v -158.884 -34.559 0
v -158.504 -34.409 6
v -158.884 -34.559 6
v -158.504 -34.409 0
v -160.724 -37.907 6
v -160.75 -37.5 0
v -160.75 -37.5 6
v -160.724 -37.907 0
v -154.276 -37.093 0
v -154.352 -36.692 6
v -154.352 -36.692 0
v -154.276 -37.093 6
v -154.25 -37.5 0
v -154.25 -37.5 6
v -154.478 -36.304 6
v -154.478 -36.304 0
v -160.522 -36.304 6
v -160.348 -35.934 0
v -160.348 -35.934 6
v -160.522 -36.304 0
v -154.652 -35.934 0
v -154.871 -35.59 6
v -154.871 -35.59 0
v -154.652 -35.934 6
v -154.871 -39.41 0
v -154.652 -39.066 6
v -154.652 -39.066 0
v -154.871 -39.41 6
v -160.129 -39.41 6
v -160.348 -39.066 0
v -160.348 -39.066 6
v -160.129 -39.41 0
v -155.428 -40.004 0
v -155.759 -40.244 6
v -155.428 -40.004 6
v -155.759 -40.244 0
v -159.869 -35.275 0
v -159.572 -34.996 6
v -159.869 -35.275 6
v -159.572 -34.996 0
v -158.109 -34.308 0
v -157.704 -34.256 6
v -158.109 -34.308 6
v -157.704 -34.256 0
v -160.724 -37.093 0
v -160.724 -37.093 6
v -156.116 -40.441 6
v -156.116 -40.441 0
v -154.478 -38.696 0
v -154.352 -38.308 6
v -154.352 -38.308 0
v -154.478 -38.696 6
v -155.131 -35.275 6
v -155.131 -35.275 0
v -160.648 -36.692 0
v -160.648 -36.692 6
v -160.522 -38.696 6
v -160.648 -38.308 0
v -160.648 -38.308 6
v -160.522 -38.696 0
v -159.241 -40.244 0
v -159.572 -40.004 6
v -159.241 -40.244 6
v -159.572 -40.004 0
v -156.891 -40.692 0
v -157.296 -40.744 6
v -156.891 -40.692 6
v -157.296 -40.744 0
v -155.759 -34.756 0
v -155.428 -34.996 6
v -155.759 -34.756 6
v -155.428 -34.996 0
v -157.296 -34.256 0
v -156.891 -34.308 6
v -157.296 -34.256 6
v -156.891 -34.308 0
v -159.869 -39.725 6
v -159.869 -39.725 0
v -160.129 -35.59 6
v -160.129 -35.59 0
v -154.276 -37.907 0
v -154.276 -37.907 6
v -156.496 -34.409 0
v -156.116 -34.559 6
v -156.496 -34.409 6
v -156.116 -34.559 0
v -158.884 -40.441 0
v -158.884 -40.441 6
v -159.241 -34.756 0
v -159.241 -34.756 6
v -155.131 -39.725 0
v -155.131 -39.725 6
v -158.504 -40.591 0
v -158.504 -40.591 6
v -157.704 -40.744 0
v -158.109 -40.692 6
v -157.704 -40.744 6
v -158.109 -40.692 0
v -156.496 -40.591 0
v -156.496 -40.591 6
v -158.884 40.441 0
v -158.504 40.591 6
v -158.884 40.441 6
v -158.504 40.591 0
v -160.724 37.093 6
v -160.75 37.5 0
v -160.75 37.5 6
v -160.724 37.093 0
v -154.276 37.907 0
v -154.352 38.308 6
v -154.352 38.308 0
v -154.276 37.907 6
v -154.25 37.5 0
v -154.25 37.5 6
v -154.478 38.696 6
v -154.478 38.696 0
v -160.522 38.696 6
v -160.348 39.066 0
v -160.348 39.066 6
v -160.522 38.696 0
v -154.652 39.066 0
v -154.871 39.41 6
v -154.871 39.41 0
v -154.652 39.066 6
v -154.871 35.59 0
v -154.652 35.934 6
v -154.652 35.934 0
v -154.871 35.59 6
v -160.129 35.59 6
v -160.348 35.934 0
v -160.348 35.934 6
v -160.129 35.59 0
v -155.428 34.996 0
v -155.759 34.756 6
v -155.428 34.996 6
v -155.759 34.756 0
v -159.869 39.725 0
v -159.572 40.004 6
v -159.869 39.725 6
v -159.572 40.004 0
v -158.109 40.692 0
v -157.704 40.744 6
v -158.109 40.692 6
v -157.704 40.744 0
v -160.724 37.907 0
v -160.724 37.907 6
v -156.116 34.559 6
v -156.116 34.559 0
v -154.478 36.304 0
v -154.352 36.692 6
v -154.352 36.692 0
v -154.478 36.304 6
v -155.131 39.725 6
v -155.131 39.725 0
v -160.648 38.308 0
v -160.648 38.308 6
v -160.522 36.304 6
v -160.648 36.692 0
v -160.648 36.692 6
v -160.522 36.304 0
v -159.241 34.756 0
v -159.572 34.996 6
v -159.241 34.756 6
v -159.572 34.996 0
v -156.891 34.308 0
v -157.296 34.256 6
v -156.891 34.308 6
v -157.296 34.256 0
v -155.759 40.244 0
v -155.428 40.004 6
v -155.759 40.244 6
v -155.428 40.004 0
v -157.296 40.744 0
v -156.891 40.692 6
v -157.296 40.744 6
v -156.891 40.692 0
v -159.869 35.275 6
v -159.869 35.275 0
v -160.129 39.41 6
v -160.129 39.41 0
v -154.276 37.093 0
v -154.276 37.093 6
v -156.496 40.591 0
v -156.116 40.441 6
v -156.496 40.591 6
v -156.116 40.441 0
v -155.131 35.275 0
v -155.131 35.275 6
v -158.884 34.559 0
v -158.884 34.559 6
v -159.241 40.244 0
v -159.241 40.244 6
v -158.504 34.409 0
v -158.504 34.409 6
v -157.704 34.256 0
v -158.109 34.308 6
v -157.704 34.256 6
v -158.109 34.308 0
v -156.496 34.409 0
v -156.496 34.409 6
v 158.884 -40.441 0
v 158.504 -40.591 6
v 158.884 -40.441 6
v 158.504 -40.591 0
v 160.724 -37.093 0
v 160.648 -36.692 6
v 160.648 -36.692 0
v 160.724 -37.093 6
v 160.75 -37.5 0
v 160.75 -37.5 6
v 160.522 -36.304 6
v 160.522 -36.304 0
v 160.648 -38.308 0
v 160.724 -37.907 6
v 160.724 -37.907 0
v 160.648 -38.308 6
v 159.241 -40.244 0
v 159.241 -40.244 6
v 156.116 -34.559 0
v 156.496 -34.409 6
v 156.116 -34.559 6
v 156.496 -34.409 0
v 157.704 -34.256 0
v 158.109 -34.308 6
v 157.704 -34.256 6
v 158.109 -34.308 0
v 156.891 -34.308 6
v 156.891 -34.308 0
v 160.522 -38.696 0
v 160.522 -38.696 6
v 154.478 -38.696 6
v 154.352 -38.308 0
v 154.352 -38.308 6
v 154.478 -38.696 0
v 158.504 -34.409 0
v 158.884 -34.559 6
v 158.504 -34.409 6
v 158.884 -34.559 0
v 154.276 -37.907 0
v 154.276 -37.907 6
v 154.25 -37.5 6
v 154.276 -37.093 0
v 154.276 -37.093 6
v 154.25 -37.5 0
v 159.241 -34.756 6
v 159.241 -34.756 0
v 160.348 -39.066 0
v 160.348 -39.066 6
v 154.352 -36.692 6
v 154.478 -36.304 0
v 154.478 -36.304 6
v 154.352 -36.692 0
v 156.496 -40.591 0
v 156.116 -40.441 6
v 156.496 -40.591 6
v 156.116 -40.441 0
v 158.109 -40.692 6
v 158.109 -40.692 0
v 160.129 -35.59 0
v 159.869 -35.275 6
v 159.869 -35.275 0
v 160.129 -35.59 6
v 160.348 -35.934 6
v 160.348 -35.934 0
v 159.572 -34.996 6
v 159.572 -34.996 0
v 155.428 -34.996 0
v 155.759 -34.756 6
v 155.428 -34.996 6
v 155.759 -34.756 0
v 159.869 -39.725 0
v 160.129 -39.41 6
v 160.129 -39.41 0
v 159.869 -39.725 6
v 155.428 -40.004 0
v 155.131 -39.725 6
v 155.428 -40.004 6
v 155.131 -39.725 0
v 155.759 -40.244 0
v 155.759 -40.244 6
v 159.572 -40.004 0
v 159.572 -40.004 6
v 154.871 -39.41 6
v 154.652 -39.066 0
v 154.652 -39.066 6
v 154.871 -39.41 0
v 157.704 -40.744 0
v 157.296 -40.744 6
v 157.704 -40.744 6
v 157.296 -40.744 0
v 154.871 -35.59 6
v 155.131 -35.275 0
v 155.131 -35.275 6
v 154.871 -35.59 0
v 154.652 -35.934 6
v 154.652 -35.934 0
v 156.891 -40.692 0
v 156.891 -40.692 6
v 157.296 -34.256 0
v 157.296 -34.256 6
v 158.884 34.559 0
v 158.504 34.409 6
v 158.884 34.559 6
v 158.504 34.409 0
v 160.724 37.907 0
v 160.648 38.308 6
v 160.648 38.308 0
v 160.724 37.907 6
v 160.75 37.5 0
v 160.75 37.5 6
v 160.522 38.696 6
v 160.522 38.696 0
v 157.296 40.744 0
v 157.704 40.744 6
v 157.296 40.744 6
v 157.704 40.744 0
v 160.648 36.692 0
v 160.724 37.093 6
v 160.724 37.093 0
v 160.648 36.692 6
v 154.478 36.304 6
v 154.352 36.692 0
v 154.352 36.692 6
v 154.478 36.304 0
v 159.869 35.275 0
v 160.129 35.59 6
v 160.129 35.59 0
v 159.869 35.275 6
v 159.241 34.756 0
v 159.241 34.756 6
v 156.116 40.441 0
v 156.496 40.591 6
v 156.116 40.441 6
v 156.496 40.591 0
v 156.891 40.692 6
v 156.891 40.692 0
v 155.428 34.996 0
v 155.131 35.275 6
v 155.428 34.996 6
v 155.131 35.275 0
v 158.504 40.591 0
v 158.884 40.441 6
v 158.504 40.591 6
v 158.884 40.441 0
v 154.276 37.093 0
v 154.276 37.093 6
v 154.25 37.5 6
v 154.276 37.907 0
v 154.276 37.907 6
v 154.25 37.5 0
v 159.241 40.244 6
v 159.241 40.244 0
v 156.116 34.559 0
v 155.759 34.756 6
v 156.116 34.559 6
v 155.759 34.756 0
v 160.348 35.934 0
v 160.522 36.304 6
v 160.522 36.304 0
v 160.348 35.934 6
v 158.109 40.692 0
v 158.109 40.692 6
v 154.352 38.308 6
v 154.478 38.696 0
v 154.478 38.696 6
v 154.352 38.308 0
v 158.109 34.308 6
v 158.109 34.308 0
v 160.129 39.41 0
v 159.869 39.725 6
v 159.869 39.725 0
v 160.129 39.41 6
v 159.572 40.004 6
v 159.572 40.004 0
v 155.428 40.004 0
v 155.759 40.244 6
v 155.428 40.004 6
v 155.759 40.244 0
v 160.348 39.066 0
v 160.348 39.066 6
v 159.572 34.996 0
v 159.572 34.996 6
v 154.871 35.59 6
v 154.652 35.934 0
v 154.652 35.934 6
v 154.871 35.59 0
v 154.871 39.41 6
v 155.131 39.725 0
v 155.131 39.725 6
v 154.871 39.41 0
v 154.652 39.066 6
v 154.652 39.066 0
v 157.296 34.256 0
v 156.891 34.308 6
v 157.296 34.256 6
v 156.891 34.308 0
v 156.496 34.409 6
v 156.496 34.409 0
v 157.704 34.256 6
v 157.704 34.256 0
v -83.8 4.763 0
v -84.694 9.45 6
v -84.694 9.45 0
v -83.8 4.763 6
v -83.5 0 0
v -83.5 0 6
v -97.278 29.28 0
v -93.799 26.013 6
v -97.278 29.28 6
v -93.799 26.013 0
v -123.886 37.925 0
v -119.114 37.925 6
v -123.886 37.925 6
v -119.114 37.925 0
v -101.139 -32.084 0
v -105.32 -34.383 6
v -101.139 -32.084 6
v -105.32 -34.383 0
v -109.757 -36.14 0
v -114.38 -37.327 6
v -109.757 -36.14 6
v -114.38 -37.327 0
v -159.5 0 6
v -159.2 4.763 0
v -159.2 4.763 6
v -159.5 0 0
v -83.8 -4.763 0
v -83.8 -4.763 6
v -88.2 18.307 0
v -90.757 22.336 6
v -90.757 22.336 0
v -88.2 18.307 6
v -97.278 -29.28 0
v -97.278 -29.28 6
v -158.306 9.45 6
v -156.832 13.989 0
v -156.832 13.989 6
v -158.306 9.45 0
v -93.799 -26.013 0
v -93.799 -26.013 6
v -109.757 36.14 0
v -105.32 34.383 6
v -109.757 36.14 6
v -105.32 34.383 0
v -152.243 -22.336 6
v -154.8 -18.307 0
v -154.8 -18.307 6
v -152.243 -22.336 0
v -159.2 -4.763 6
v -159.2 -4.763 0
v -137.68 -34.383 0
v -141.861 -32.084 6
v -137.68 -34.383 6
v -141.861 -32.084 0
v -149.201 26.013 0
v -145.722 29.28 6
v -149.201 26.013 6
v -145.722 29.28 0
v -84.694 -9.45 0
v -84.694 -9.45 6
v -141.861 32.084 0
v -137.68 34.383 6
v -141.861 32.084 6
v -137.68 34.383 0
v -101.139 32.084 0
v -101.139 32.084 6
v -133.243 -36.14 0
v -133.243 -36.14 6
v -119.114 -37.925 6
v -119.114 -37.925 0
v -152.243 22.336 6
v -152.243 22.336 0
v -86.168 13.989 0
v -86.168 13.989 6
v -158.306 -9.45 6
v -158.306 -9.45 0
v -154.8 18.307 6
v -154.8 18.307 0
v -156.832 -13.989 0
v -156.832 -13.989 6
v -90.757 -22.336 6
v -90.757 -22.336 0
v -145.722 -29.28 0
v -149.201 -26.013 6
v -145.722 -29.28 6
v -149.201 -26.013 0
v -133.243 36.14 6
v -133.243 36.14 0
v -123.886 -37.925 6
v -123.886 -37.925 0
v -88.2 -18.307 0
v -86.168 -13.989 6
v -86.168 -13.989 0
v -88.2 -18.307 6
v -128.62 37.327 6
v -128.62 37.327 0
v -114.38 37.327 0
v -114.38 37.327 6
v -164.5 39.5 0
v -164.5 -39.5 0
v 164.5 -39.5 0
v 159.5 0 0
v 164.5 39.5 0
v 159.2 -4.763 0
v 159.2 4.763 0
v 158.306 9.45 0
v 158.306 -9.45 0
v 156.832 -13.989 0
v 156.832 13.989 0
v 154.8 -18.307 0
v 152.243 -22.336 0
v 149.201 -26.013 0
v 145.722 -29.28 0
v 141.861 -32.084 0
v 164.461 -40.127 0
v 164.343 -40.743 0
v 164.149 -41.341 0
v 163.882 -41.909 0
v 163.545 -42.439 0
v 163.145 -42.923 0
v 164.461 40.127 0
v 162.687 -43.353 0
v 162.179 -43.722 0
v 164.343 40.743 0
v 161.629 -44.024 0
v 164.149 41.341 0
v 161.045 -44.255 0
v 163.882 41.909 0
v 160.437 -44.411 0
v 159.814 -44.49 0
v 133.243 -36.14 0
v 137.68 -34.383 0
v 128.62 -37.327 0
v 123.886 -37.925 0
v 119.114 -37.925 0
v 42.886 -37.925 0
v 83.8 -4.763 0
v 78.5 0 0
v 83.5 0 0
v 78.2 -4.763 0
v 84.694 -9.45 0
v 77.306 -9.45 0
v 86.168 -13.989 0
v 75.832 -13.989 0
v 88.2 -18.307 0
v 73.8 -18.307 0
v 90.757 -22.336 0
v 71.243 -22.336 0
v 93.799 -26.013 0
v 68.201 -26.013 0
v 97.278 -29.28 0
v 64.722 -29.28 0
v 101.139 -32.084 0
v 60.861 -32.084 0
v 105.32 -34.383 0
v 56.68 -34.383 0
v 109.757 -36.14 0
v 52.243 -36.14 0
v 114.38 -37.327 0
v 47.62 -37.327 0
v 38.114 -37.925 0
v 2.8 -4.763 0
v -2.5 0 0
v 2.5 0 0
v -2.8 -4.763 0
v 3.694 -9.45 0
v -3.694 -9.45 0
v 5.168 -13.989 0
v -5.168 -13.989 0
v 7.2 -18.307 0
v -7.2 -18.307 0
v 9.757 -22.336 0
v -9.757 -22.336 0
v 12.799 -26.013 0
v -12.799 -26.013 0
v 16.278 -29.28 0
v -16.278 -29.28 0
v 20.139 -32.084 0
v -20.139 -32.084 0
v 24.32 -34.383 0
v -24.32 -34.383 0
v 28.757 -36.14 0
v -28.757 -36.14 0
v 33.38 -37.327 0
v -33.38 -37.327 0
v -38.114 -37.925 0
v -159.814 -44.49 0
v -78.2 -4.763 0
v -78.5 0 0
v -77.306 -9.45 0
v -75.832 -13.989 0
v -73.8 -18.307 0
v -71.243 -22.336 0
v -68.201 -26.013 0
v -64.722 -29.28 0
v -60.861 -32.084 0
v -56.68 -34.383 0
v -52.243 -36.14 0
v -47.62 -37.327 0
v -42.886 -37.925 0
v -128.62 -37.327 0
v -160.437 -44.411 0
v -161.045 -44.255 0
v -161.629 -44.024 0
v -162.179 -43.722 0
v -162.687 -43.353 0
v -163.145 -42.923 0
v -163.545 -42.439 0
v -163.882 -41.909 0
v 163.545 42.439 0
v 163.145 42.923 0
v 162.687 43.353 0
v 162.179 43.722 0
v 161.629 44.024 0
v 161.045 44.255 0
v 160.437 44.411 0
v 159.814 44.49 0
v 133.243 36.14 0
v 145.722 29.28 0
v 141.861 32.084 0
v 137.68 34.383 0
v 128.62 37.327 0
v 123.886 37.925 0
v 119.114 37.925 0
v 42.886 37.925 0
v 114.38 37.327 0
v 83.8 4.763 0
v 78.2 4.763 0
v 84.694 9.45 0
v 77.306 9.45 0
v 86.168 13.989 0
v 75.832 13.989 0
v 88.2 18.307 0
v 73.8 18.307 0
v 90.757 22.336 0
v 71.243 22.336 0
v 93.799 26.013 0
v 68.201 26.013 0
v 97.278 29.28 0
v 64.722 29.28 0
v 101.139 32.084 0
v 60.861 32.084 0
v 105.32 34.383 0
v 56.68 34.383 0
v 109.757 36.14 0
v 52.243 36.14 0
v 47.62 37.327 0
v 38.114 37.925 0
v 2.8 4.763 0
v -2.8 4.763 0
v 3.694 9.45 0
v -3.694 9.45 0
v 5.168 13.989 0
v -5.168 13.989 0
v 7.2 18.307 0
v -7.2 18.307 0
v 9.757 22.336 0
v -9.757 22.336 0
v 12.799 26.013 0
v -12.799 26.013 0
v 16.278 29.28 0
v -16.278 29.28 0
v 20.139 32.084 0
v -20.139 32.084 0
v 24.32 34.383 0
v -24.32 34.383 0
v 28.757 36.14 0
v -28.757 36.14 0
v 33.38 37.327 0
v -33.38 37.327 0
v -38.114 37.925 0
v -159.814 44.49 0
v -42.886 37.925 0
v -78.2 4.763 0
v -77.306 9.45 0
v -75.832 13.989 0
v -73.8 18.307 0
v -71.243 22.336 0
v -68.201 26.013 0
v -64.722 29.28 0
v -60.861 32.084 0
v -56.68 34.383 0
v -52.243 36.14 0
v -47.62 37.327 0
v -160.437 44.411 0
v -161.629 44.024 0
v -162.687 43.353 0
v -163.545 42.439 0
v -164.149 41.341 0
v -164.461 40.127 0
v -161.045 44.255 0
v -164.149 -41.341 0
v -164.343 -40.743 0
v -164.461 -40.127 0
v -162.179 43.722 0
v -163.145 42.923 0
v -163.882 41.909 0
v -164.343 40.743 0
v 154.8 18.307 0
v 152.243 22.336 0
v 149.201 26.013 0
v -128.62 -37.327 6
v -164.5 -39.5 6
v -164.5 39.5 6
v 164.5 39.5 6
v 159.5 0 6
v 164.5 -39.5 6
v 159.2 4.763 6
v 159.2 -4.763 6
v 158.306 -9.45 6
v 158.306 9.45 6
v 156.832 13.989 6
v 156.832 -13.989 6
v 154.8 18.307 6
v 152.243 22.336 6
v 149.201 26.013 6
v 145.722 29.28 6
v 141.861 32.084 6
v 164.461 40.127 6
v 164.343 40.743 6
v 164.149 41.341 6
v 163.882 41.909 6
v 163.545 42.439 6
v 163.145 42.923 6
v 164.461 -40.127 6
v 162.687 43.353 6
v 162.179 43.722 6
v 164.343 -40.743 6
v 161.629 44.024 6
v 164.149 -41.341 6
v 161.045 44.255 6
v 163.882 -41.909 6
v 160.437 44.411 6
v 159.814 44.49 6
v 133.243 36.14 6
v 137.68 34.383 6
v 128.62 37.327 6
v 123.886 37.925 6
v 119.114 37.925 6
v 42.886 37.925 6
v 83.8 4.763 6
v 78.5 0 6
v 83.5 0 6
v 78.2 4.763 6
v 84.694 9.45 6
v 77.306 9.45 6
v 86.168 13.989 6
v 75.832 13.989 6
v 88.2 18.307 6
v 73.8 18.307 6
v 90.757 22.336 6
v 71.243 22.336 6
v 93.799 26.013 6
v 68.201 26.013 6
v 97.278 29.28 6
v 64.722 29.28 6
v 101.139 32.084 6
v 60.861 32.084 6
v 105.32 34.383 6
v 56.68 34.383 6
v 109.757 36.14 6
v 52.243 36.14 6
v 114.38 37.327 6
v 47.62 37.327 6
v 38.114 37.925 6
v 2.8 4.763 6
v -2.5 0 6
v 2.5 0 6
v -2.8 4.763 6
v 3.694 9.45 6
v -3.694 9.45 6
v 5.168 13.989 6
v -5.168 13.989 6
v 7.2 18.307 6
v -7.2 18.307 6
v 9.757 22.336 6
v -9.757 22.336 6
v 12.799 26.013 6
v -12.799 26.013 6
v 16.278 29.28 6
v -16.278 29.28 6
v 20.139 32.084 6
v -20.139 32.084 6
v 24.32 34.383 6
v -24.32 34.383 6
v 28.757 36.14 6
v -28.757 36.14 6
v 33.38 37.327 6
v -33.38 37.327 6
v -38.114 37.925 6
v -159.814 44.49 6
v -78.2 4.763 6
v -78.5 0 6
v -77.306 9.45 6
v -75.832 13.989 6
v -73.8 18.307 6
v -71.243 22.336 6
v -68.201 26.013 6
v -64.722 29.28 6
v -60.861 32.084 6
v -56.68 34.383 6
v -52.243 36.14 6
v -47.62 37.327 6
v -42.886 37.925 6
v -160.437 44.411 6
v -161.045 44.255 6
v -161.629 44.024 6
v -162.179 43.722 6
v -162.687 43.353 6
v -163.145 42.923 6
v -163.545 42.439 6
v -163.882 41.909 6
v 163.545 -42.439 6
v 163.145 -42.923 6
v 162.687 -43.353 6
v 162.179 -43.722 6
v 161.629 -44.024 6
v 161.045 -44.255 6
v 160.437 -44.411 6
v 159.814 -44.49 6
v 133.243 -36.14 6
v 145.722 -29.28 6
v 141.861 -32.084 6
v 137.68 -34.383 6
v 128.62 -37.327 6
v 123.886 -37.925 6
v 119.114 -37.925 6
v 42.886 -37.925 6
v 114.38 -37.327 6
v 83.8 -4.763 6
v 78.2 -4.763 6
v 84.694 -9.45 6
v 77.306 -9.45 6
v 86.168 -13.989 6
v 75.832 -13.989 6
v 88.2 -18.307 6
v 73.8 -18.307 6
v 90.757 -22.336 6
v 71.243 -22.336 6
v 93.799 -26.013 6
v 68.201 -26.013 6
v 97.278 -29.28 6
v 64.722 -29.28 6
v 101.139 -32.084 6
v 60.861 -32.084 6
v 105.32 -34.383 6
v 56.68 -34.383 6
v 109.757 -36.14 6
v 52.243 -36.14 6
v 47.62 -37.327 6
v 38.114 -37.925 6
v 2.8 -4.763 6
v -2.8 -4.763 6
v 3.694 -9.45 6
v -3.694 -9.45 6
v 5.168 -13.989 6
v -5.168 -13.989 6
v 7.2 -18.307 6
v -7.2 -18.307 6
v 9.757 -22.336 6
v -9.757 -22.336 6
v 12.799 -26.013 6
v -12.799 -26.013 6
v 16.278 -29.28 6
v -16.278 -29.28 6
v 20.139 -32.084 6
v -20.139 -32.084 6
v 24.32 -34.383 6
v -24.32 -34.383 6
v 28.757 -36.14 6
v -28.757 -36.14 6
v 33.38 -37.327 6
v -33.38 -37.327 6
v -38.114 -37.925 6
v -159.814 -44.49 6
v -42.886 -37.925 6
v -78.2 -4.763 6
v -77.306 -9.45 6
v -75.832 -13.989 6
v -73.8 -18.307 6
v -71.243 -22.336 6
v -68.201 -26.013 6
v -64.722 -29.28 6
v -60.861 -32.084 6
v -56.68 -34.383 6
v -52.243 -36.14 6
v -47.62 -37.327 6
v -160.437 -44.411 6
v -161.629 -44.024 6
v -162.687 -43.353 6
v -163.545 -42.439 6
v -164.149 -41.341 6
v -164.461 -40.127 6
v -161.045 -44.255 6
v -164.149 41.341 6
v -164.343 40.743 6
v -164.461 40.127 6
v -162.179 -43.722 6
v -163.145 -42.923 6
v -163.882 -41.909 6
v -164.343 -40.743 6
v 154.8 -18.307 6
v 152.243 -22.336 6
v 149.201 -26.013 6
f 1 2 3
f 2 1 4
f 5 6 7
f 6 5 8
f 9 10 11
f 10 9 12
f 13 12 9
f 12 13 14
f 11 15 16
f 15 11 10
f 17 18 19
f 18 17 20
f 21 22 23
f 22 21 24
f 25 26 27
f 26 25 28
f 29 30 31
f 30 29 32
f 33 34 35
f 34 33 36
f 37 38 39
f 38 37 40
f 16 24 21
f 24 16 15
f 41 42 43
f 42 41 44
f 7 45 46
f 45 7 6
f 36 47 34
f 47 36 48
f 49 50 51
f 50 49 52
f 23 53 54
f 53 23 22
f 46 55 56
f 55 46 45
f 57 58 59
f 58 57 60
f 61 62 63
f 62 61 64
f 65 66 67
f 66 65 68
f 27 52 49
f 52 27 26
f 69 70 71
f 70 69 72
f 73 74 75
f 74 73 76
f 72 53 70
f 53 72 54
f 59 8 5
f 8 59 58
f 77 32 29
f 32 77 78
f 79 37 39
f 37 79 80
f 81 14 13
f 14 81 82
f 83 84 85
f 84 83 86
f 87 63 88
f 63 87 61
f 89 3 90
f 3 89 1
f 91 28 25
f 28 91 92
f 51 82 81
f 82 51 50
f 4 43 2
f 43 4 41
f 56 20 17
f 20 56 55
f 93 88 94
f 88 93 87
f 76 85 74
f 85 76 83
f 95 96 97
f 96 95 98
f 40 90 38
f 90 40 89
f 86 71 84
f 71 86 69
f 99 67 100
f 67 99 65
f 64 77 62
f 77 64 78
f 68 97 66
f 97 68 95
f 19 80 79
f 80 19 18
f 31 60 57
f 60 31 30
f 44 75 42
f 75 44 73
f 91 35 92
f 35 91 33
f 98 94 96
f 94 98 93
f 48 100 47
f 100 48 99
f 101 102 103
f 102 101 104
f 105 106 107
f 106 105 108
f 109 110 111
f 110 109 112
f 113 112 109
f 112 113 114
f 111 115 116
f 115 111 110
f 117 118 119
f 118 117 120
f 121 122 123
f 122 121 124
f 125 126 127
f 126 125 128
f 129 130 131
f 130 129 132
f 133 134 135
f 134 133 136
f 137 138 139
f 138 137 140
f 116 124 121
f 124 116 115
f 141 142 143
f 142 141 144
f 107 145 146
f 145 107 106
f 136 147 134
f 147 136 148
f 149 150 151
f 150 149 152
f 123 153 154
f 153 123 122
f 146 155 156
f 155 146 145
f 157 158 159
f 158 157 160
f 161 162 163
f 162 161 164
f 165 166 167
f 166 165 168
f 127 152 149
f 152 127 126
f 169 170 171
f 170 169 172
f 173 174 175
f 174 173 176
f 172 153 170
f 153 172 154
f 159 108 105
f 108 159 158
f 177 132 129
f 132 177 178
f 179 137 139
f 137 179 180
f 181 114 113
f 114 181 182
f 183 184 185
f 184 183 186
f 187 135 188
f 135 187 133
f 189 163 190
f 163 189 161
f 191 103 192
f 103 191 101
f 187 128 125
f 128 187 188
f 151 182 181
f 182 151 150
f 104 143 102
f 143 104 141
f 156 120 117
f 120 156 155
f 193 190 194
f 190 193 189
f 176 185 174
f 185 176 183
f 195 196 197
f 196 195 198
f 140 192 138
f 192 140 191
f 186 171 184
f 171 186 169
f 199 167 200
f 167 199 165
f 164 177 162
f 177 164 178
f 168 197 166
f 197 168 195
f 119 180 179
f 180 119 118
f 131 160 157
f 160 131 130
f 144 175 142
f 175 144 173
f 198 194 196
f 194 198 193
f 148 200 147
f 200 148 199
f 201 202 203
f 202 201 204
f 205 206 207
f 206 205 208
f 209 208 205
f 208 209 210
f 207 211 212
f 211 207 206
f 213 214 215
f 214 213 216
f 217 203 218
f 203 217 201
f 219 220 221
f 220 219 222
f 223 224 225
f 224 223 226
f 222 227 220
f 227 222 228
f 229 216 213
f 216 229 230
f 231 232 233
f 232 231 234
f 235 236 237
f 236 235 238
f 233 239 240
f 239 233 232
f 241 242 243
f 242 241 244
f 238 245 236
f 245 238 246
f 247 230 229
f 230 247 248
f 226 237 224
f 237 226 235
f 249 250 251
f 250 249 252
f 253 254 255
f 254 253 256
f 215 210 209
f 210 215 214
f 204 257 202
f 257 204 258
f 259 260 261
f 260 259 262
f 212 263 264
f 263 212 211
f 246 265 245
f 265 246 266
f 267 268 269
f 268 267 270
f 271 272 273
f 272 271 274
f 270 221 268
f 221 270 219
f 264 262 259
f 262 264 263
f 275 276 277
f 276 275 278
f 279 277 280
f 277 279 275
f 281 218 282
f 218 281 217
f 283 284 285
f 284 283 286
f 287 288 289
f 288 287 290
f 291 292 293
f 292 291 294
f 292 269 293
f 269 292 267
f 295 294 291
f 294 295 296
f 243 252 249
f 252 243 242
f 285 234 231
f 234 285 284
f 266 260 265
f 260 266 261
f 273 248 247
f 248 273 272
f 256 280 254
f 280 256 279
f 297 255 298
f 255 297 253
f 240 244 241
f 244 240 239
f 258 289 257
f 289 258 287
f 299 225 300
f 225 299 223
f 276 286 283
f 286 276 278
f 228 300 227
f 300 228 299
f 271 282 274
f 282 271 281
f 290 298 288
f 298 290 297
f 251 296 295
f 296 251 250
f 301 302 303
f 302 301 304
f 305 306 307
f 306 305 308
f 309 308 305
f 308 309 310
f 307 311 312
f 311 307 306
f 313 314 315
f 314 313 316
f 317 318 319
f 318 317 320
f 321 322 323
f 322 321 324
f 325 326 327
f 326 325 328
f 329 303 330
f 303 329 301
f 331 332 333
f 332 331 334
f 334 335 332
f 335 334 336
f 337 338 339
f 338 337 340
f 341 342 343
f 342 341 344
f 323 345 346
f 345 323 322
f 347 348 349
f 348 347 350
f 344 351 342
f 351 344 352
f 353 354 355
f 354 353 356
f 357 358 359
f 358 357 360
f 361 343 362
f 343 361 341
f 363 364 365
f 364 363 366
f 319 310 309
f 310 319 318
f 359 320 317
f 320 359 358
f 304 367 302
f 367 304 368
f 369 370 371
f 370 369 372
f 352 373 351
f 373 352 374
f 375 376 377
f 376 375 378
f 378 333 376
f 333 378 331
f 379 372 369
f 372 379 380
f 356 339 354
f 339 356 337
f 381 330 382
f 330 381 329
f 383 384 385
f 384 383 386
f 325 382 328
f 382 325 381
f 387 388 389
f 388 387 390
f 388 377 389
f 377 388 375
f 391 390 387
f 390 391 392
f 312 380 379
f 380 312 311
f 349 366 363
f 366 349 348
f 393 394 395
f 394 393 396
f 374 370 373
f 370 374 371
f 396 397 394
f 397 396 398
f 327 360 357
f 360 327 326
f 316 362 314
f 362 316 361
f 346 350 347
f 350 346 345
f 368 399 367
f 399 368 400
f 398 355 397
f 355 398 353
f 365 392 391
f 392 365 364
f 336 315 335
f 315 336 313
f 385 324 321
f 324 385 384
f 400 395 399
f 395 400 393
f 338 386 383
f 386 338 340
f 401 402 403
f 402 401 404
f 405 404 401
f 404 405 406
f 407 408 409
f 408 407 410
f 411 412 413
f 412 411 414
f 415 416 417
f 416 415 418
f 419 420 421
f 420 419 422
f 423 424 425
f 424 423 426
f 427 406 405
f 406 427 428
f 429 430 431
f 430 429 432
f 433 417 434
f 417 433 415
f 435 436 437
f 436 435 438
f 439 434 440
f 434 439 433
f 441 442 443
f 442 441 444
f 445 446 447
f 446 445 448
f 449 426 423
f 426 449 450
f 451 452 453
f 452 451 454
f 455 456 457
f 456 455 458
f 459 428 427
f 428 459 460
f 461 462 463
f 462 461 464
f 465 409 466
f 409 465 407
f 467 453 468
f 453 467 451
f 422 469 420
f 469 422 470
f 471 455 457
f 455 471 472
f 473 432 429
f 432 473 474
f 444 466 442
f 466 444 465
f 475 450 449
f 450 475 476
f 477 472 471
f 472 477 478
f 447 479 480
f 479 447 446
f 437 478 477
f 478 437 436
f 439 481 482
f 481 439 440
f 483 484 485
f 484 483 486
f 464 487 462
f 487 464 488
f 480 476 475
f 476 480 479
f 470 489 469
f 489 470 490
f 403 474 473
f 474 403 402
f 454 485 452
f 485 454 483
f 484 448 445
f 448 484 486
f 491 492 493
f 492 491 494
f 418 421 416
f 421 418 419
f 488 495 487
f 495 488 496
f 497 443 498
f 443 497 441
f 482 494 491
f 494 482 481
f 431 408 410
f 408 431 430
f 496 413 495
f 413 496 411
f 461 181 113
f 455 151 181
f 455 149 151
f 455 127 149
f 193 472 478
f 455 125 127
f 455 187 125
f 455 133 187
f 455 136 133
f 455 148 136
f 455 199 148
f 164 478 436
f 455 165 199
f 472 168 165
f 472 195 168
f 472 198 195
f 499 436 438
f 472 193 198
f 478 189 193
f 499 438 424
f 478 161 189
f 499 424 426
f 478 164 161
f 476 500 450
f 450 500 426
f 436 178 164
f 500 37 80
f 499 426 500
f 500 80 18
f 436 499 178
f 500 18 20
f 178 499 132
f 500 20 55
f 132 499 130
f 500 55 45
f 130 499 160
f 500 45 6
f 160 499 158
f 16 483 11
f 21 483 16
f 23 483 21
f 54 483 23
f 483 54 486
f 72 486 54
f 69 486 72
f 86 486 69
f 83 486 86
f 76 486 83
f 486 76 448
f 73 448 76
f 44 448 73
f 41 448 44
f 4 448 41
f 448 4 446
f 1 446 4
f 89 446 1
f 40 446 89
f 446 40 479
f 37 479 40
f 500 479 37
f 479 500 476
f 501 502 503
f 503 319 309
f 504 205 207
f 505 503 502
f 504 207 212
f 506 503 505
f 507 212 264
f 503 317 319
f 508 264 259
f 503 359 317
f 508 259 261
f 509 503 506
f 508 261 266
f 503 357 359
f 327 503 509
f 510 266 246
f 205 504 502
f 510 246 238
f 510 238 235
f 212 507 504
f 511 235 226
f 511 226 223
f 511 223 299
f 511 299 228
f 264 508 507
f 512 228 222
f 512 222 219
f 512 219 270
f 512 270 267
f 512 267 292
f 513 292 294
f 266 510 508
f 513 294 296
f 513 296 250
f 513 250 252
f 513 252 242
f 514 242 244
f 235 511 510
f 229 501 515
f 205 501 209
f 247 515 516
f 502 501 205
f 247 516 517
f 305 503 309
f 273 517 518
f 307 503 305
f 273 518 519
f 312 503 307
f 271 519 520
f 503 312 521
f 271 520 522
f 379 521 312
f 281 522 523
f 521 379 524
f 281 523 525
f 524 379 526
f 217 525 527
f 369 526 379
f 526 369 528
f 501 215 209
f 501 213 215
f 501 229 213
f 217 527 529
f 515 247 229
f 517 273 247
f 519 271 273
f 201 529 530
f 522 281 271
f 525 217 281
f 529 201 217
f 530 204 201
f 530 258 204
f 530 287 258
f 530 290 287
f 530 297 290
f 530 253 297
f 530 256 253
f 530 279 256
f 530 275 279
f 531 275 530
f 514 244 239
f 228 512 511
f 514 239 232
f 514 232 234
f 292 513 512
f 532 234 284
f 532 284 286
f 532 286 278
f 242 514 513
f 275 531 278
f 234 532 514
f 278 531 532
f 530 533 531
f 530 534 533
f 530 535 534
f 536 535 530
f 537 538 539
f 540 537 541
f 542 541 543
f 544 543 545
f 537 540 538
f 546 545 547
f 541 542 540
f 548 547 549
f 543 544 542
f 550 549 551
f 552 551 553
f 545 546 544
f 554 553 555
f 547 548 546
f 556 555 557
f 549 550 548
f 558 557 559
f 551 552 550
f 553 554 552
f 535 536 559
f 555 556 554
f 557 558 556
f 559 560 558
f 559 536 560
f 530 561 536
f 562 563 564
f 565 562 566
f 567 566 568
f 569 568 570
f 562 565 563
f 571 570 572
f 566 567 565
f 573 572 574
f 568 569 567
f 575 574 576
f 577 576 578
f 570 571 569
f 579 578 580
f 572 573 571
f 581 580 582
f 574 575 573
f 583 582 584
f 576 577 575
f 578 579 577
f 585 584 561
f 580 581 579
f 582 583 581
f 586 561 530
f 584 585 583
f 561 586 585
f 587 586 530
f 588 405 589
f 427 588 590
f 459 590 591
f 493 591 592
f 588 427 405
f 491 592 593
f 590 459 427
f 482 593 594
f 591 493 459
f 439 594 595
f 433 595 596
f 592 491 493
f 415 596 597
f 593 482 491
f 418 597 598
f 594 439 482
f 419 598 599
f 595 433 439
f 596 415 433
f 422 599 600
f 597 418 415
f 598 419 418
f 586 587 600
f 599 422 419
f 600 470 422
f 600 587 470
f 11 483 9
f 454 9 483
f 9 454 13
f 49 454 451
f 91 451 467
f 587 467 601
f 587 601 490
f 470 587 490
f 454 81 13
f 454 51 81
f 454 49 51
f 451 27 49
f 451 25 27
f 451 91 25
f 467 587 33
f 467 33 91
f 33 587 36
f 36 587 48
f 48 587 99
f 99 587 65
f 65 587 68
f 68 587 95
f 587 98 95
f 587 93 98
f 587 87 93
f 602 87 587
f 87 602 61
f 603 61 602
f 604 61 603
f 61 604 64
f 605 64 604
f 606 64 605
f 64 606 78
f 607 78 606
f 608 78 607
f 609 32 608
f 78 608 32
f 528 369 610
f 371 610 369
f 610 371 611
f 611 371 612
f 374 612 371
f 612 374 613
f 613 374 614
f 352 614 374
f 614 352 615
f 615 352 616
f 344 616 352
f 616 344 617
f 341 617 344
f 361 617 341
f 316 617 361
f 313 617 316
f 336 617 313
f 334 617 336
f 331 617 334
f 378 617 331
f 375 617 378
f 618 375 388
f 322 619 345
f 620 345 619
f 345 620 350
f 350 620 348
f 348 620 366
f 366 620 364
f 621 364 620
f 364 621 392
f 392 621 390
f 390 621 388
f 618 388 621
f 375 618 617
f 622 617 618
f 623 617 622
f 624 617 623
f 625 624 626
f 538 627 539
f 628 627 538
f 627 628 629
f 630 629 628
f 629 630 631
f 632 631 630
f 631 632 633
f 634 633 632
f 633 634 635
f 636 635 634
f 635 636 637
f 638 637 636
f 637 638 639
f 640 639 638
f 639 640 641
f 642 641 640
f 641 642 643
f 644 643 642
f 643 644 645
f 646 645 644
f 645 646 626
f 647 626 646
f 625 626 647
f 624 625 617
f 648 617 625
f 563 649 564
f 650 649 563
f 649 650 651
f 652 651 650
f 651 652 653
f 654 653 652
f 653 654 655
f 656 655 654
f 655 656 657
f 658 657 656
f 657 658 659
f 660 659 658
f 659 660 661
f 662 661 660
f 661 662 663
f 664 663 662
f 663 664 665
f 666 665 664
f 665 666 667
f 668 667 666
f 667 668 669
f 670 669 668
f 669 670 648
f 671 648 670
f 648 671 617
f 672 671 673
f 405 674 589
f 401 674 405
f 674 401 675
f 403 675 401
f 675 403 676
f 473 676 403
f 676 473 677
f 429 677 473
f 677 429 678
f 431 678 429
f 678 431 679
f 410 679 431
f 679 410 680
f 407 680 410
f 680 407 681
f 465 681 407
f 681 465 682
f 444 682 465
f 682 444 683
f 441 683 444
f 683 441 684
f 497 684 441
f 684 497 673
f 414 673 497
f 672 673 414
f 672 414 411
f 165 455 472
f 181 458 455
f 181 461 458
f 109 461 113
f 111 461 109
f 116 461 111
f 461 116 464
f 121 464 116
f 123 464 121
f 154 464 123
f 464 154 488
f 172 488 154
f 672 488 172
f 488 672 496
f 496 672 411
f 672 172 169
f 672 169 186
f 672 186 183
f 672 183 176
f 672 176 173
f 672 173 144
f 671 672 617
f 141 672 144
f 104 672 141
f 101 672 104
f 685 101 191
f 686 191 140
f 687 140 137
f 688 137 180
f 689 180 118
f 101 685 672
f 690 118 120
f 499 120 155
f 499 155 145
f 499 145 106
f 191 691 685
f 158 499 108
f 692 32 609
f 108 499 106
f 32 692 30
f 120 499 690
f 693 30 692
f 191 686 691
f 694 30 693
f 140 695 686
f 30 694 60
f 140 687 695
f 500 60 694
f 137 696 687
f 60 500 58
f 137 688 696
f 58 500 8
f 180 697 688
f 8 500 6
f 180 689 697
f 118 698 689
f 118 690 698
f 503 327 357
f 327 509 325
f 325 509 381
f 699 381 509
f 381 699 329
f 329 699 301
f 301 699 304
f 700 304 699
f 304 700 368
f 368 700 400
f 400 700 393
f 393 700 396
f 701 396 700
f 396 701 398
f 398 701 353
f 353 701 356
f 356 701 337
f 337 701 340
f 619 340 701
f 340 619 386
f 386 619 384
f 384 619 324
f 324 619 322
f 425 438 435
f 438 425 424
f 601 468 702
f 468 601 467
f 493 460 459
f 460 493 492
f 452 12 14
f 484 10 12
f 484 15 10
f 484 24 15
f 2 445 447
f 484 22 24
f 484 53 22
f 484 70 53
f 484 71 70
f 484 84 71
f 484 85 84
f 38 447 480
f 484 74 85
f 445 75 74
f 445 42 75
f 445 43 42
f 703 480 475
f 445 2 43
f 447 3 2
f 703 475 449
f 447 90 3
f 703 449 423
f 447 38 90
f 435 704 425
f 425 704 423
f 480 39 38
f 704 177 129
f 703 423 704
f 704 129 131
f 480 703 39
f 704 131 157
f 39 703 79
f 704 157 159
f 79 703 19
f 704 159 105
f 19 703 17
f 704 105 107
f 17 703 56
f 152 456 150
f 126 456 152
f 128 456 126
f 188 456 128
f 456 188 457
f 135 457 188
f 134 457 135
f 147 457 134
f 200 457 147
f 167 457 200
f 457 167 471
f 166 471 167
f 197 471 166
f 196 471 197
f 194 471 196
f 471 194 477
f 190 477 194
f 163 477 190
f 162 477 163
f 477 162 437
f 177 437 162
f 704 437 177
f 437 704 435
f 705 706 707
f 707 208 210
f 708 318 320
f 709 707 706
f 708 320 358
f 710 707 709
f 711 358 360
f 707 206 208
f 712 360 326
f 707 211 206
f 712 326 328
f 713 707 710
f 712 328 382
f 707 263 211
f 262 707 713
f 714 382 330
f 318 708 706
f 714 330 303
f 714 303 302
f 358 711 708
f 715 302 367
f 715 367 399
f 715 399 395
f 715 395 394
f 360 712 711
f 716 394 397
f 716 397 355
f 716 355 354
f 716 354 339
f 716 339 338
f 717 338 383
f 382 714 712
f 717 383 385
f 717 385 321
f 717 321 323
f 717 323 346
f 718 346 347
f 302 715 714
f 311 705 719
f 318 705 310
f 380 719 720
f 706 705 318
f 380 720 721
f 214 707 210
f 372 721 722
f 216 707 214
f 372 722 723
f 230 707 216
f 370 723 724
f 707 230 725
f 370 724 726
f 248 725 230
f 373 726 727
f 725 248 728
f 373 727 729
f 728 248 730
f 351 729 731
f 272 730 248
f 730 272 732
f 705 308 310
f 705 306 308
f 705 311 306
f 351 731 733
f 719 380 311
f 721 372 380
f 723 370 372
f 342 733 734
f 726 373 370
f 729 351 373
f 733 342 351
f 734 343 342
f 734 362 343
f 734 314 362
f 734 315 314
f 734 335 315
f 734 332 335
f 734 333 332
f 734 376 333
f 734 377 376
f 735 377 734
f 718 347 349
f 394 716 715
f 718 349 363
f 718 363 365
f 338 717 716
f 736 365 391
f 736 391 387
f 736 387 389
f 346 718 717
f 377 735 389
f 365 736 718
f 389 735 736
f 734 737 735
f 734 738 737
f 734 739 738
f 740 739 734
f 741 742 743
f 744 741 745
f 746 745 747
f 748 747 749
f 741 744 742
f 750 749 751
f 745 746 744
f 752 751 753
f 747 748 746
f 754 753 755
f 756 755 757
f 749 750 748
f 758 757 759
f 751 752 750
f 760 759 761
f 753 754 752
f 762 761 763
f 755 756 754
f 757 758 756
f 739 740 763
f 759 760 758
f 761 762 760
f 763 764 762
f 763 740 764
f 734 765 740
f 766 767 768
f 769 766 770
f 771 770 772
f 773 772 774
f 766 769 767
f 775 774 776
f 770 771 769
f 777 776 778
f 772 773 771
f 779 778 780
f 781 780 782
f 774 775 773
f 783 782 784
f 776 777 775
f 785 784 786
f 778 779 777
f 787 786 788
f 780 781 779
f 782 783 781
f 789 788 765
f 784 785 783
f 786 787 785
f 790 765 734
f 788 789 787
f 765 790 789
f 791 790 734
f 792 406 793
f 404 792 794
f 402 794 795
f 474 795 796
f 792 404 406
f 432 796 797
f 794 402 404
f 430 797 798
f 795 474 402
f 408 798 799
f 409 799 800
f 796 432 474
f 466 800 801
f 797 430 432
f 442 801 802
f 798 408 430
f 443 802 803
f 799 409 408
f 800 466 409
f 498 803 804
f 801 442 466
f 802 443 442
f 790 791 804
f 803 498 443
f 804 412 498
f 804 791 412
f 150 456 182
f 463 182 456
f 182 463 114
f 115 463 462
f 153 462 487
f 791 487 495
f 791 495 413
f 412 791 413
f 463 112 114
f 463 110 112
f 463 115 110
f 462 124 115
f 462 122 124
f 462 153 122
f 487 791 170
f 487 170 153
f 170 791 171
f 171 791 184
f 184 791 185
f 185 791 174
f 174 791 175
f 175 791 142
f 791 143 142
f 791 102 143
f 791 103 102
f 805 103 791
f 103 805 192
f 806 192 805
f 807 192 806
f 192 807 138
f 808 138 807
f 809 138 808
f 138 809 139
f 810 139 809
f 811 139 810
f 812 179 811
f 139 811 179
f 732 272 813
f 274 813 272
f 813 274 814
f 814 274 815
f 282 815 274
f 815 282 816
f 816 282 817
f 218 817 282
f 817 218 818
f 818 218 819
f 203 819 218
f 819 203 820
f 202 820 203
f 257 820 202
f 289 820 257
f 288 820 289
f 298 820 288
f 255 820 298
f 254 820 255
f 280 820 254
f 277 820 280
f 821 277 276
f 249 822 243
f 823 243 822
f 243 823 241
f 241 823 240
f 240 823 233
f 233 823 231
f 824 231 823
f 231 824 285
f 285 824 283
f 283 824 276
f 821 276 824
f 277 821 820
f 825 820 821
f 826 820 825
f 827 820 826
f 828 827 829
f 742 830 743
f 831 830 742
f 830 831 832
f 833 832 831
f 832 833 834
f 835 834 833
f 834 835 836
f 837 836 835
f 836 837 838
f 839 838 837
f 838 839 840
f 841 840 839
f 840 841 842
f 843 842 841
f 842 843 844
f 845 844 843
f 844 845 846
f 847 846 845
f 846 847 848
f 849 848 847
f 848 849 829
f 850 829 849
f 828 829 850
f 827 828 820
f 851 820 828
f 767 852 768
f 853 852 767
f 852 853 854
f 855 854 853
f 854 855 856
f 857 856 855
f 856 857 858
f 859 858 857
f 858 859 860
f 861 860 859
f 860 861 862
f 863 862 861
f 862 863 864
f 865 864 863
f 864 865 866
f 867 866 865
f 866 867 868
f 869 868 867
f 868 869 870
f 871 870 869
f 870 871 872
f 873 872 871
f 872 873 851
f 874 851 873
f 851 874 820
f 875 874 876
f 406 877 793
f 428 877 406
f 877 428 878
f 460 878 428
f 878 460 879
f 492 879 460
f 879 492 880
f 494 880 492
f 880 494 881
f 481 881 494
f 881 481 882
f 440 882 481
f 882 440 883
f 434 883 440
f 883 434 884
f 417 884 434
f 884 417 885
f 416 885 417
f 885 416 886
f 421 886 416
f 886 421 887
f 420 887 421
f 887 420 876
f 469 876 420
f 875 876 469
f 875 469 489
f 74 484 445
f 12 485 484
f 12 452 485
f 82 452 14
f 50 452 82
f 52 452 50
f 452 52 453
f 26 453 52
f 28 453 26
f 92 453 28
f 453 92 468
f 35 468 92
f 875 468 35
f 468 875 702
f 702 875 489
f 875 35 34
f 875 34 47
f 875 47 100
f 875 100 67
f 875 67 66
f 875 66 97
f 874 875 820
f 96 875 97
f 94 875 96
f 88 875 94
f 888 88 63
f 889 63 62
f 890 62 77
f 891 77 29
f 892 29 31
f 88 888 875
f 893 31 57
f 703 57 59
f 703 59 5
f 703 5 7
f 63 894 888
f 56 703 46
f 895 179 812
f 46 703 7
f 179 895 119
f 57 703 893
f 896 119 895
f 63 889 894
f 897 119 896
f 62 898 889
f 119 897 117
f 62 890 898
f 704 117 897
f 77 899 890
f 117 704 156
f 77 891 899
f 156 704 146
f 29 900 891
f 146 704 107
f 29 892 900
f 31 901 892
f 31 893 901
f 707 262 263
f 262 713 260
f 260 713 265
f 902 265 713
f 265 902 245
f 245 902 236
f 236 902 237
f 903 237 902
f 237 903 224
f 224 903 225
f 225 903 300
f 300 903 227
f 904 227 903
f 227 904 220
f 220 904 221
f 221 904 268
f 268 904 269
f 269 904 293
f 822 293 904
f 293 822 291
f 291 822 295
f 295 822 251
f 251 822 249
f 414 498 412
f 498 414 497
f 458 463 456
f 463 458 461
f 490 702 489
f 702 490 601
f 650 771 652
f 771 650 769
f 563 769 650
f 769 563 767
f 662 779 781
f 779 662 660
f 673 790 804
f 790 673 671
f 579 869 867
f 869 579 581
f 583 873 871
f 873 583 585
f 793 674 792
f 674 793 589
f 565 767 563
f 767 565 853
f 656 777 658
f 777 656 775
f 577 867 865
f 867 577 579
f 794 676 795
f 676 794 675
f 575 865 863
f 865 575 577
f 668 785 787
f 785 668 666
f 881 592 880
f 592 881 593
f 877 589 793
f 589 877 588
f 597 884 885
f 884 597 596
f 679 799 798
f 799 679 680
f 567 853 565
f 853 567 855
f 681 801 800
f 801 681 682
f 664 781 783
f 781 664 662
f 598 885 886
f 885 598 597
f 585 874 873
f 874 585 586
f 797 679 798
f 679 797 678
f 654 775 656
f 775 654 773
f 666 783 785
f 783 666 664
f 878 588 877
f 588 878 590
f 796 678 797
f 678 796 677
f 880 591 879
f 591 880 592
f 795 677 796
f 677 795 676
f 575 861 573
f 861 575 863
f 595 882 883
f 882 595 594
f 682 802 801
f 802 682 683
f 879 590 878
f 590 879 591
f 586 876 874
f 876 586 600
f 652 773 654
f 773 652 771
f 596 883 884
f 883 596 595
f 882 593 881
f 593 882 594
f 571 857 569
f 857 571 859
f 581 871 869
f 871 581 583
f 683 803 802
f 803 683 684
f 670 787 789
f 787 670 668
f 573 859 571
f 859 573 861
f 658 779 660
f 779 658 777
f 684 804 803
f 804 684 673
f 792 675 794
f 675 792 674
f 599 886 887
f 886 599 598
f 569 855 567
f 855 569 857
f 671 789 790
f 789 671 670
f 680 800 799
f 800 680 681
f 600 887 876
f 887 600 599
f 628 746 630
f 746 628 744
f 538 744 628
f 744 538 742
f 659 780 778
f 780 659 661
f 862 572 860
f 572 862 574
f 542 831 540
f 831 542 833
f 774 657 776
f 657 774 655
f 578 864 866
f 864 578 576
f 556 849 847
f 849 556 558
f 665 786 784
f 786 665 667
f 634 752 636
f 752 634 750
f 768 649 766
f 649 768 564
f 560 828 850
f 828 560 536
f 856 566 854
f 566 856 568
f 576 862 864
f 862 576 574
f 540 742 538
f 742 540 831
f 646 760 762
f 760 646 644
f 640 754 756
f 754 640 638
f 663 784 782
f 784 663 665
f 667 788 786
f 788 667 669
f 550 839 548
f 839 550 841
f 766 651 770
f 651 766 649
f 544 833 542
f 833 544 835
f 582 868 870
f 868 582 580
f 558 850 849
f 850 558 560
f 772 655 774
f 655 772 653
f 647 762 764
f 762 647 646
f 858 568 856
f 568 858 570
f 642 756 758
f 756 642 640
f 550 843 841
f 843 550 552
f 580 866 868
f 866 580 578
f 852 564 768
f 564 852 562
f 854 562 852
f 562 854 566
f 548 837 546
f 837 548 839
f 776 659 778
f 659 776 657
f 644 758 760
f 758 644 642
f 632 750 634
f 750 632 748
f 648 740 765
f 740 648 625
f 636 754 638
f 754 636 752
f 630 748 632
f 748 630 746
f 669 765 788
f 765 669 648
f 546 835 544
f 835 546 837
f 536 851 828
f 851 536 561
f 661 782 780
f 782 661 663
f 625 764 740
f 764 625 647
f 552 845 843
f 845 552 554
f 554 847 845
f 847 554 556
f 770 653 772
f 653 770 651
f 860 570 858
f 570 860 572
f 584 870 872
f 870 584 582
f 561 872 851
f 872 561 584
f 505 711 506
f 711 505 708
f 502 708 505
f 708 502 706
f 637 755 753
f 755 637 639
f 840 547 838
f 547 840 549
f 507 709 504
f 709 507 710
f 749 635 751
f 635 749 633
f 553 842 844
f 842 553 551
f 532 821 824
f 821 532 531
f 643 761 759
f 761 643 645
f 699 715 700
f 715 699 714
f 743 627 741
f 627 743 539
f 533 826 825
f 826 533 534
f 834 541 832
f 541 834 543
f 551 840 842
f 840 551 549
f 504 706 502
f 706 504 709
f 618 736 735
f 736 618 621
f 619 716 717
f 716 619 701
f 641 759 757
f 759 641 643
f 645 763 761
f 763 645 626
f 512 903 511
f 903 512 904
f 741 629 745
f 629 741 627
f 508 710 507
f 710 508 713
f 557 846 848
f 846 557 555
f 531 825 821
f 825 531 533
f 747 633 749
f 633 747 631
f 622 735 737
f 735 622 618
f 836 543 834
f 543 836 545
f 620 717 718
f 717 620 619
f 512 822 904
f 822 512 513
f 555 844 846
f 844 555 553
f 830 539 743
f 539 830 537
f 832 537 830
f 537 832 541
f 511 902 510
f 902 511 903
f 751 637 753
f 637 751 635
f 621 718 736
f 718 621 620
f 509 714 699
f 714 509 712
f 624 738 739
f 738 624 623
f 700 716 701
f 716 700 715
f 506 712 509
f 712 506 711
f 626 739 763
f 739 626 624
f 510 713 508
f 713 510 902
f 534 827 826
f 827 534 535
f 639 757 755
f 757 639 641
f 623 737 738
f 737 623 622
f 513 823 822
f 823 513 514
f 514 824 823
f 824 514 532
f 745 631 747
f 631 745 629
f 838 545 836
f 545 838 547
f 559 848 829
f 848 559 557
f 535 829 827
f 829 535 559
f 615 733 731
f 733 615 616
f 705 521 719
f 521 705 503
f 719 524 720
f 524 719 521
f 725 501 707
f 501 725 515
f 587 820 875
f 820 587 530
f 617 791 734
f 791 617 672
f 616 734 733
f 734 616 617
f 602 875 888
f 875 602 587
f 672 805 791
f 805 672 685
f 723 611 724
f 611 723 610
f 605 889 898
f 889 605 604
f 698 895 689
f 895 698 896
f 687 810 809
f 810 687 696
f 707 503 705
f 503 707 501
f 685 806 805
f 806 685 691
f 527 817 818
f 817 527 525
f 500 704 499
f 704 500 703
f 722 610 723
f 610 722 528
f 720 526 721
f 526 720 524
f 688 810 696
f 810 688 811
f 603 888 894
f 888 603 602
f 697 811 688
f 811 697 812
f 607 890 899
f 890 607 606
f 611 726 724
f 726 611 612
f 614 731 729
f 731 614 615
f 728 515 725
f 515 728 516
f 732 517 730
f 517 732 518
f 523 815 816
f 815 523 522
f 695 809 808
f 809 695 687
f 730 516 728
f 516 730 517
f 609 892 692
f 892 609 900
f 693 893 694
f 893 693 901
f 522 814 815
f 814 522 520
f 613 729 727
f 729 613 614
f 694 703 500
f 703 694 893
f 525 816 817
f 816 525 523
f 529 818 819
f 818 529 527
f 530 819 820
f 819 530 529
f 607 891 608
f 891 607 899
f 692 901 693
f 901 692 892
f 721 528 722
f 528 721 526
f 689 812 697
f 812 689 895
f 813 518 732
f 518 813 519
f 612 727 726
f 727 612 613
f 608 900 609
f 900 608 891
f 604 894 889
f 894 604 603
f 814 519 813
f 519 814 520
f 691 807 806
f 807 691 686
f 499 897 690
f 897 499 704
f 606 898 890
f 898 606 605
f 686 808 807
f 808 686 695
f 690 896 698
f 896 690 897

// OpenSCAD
$fn = 50;


difference() {
	union() {
		hull() {
			translate(v = [-159.5000000000, 39.5000000000, 0]) {
				cylinder(h = 6, r = 5);
			}
			translate(v = [159.5000000000, 39.5000000000, 0]) {
				cylinder(h = 6, r = 5);
			}
			translate(v = [-159.5000000000, -39.5000000000, 0]) {
				cylinder(h = 6, r = 5);
			}
			translate(v = [159.5000000000, -39.5000000000, 0]) {
				cylinder(h = 6, r = 5);
			}
		}
	}
	union() {
		#translate(v = [-157.5000000000, -37.5000000000, -100.0000000000]) {
			cylinder(h = 200, r = 3.2500000000);
		}
		#translate(v = [-157.5000000000, 37.5000000000, -100.0000000000]) {
			cylinder(h = 200, r = 3.2500000000);
		}
		#translate(v = [157.5000000000, -37.5000000000, -100.0000000000]) {
			cylinder(h = 200, r = 3.2500000000);
		}
		#translate(v = [157.5000000000, 37.5000000000, -100.0000000000]) {
			cylinder(h = 200, r = 3.2500000000);
		}
		#translate(v = [-121.5000000000, 0, 0]) {
			cylinder(h = 6, r = 38.0000000000);
		}
		#translate(v = [-40.5000000000, 0, 0]) {
			cylinder(h = 6, r = 38.0000000000);
		}
		#translate(v = [40.5000000000, 0, 0]) {
			cylinder(h = 6, r = 38.0000000000);
		}
		#translate(v = [121.5000000000, 0, 0]) {
			cylinder(h = 6, r = 38.0000000000);
		}
	}
}
